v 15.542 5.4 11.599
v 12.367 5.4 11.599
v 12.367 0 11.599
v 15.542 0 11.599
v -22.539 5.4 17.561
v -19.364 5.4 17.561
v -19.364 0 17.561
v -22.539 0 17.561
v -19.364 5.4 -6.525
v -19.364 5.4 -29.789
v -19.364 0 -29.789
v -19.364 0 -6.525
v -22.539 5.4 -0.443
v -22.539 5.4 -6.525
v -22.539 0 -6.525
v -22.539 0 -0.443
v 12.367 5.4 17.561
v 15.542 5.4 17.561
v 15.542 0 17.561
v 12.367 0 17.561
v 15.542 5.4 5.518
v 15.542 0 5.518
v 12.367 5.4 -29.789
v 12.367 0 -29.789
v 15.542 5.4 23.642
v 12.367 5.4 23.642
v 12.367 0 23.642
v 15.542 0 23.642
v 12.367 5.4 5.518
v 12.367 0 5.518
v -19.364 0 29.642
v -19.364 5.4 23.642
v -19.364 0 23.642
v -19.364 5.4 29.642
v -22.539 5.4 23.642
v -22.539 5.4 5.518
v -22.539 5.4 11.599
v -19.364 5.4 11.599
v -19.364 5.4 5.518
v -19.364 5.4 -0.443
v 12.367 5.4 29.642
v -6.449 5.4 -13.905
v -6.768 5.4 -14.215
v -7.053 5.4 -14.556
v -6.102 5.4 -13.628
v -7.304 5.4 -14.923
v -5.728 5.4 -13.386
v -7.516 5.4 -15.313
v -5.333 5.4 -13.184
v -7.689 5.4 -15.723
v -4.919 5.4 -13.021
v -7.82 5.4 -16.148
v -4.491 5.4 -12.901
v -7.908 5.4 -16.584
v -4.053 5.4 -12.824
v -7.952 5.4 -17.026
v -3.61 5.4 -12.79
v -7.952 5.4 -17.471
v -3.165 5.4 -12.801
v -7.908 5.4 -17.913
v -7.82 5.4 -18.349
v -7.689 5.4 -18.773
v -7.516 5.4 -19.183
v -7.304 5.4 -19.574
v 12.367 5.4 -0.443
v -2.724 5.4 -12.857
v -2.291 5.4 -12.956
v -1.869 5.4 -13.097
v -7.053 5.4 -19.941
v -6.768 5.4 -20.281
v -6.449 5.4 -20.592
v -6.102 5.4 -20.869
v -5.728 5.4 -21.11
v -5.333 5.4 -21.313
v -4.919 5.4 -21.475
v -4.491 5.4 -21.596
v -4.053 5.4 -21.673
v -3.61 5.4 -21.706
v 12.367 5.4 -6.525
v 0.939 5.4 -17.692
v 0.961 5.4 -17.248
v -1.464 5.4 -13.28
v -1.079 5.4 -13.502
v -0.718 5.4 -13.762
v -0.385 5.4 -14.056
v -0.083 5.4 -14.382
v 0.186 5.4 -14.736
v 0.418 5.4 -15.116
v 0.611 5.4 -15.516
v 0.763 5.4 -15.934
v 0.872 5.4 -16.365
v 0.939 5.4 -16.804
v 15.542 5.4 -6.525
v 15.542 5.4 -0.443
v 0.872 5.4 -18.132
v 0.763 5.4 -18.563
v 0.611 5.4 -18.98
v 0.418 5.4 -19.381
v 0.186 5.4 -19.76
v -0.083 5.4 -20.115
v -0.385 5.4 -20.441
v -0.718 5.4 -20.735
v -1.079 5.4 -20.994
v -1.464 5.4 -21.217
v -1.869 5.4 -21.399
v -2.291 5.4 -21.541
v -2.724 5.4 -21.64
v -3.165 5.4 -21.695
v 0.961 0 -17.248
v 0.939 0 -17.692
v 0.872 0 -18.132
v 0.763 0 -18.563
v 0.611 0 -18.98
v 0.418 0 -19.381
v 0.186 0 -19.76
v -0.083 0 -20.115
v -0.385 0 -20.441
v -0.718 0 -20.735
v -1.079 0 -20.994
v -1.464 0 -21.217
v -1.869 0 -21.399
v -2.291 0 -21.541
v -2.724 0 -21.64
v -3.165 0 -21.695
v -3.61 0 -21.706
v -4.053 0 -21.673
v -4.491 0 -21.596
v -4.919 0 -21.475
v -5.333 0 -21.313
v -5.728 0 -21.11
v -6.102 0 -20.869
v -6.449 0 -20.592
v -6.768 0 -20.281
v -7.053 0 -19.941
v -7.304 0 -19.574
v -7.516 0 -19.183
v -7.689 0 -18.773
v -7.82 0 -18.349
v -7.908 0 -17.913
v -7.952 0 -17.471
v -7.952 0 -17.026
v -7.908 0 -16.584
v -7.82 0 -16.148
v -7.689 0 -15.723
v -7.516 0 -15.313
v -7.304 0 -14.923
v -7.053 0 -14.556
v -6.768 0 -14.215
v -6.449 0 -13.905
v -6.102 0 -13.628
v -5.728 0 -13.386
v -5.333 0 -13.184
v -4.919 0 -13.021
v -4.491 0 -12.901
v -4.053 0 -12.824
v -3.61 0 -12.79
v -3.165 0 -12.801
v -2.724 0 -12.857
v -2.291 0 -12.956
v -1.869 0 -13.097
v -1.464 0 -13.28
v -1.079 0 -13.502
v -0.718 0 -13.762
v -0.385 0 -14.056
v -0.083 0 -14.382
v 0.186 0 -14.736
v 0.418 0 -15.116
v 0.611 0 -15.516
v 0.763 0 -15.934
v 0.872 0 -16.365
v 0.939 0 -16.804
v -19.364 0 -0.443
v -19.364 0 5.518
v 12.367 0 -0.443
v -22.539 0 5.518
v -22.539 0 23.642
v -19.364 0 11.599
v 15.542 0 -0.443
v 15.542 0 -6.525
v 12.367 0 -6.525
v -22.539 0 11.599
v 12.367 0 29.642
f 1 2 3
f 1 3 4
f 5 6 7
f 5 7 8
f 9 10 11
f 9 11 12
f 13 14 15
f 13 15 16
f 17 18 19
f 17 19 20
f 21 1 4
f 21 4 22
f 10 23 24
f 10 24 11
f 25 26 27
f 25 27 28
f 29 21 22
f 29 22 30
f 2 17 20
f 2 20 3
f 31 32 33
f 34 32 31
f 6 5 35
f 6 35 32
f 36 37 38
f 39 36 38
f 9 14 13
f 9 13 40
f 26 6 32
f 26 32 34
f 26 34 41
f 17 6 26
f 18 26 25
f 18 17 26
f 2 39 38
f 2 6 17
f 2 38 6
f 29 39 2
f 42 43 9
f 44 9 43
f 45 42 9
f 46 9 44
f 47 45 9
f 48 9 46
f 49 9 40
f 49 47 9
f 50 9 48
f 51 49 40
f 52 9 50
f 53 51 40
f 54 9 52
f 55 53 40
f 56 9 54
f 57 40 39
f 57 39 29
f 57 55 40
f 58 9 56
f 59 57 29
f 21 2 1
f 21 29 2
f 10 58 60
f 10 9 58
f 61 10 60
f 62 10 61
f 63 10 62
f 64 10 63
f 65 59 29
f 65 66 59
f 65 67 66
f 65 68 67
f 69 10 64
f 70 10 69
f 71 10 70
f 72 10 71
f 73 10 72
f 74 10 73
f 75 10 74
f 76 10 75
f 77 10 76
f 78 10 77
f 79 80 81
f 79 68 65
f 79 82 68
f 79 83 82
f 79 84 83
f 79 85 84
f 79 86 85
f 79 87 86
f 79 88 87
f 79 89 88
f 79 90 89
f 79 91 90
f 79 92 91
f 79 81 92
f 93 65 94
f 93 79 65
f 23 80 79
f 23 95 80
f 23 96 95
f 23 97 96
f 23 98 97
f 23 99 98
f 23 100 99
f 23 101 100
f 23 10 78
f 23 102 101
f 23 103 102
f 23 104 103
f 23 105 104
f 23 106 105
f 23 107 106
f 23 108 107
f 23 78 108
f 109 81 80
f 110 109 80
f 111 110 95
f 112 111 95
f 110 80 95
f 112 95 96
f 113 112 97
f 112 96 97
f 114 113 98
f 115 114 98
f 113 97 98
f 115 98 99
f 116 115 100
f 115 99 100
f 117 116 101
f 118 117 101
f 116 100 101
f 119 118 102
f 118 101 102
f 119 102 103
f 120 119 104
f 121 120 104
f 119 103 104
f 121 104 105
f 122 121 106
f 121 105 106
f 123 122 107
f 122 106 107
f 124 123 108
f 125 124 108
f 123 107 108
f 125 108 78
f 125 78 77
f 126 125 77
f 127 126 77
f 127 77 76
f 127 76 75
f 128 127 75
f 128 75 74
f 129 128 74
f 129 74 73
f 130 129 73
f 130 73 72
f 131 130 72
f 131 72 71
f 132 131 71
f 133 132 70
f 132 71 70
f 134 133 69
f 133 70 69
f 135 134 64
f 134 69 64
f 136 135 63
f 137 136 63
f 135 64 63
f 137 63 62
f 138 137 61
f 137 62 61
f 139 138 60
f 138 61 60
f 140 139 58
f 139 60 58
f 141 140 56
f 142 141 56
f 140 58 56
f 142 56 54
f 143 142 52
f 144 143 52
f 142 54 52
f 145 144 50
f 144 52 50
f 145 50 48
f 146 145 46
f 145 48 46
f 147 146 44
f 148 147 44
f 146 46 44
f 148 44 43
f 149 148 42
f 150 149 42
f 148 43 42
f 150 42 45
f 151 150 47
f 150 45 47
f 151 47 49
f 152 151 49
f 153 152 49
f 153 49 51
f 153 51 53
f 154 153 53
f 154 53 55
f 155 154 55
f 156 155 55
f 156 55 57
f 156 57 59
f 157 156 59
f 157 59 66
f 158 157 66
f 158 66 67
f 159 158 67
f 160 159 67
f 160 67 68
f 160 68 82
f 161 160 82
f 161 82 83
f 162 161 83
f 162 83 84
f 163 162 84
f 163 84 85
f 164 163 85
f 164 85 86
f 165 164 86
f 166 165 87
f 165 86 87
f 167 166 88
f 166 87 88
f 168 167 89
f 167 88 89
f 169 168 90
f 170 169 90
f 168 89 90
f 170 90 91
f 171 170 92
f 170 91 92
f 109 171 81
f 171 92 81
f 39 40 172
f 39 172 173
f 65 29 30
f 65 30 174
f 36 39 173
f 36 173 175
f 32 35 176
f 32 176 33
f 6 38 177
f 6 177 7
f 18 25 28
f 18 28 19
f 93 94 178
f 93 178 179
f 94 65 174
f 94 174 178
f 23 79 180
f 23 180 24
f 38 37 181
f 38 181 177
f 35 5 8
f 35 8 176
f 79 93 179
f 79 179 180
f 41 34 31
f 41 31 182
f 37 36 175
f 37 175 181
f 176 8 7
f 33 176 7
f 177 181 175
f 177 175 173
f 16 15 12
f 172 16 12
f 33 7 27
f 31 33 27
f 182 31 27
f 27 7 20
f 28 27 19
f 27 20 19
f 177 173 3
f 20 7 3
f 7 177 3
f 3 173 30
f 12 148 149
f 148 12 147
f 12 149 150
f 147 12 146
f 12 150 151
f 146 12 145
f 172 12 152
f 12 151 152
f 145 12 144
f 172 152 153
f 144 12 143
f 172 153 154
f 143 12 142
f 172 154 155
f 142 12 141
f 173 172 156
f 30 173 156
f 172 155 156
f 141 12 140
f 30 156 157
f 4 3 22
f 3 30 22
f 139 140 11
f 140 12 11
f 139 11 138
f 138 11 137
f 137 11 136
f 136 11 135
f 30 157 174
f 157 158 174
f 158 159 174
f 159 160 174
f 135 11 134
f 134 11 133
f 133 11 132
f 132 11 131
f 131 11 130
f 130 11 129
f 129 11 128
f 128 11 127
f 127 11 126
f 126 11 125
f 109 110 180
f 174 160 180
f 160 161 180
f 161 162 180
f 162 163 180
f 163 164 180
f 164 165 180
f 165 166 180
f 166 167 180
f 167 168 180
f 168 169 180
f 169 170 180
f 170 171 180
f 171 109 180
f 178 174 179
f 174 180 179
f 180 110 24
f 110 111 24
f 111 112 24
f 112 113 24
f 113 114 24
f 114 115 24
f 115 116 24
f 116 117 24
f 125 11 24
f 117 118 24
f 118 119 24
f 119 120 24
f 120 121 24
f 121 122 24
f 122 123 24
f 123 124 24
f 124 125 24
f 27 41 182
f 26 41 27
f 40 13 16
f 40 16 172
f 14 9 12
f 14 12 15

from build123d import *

# Parameters (mm, degrees)
SKETCH1_W           = 31.65
SKETCH1_H           = 59.35
SKETCH1_R           = 4.5
SKETCH1_W_2         = 3.175
SKETCH1_H_2         = 6
BOSS_EXTRUDE1_DEPTH = 5.4
SKETCH2_R           = 4.45936
BOSS_EXTRUDE2_DEPTH = 5.4


with BuildPart() as part:
    # Sketch1 → Boss-Extrude1 (new body)
    with BuildSketch(Plane(origin=(0, 0, 0), x_dir=(1, 0, 0), z_dir=(0, 1, 0))):
        with Locations((-3.498626473, 0.073295681)):
            Rectangle(SKETCH1_W, SKETCH1_H)
        with Locations((-3.498626473, 17.248295681)):
            Circle(SKETCH1_R, mode=Mode.SUBTRACT)
        with Locations((-20.911126473, 3.484009967)):
            Rectangle(SKETCH1_W_2, SKETCH1_H_2)
        with Locations((-20.911126473, -8.558847176)):
            Rectangle(SKETCH1_W_2, SKETCH1_H_2)
        with Locations((-20.911126473, -20.601704319)):
            Rectangle(SKETCH1_W_2, SKETCH1_H_2)
        with Locations((13.913873527, -20.601704319)):
            Rectangle(SKETCH1_W_2, SKETCH1_H_2)
        with Locations((13.913873527, -8.558847176)):
            Rectangle(SKETCH1_W_2, SKETCH1_H_2)
        with Locations((13.913873527, 3.484009967)):
            Rectangle(SKETCH1_W_2, SKETCH1_H_2)
    extrude(amount=BOSS_EXTRUDE1_DEPTH)

    # Sketch2 → Boss-Extrude2 (add)
    with BuildSketch(Plane(origin=(0, 5.4, 0), x_dir=(1, 0, 0), z_dir=(0, 1, 0))):
        Polygon((12.367013527, 6.524649967), (12.367013527, 29.788935681), (-19.364266473, 29.788935681), (-19.364266473, 6.524649967), (-22.539266473, 6.524649967), (-22.539266473, 0.443369967), (-19.364266473, 0.443369967), (-19.364266473, -5.518207176), (-22.539266473, -5.518207176), (-22.539266473, -11.599487176), (-19.364266473, -11.599487176), (-19.364266473, -17.561064319), (-22.539266473, -17.561064319), (-22.539266473, -23.642344319), (-19.364266473, -23.642344319), (-19.364266473, -29.642344319), (12.367013527, -29.642344319), (12.367013527, -23.642344319), (15.542013527, -23.642344319), (15.542013527, -17.561064319), (12.367013527, -17.561064319), (12.367013527, -11.599487176), (15.542013527, -11.599487176), (15.542013527, -5.518207176), (12.367013527, -5.518207176), (12.367013527, 0.443369967), (15.542013527, 0.443369967), (15.542013527, 6.524649967), align=None)
        with Locations((-3.498626473, 17.248295681)):
            Circle(SKETCH2_R, mode=Mode.SUBTRACT)
    extrude(amount=-BOSS_EXTRUDE2_DEPTH)


solid = part.part
